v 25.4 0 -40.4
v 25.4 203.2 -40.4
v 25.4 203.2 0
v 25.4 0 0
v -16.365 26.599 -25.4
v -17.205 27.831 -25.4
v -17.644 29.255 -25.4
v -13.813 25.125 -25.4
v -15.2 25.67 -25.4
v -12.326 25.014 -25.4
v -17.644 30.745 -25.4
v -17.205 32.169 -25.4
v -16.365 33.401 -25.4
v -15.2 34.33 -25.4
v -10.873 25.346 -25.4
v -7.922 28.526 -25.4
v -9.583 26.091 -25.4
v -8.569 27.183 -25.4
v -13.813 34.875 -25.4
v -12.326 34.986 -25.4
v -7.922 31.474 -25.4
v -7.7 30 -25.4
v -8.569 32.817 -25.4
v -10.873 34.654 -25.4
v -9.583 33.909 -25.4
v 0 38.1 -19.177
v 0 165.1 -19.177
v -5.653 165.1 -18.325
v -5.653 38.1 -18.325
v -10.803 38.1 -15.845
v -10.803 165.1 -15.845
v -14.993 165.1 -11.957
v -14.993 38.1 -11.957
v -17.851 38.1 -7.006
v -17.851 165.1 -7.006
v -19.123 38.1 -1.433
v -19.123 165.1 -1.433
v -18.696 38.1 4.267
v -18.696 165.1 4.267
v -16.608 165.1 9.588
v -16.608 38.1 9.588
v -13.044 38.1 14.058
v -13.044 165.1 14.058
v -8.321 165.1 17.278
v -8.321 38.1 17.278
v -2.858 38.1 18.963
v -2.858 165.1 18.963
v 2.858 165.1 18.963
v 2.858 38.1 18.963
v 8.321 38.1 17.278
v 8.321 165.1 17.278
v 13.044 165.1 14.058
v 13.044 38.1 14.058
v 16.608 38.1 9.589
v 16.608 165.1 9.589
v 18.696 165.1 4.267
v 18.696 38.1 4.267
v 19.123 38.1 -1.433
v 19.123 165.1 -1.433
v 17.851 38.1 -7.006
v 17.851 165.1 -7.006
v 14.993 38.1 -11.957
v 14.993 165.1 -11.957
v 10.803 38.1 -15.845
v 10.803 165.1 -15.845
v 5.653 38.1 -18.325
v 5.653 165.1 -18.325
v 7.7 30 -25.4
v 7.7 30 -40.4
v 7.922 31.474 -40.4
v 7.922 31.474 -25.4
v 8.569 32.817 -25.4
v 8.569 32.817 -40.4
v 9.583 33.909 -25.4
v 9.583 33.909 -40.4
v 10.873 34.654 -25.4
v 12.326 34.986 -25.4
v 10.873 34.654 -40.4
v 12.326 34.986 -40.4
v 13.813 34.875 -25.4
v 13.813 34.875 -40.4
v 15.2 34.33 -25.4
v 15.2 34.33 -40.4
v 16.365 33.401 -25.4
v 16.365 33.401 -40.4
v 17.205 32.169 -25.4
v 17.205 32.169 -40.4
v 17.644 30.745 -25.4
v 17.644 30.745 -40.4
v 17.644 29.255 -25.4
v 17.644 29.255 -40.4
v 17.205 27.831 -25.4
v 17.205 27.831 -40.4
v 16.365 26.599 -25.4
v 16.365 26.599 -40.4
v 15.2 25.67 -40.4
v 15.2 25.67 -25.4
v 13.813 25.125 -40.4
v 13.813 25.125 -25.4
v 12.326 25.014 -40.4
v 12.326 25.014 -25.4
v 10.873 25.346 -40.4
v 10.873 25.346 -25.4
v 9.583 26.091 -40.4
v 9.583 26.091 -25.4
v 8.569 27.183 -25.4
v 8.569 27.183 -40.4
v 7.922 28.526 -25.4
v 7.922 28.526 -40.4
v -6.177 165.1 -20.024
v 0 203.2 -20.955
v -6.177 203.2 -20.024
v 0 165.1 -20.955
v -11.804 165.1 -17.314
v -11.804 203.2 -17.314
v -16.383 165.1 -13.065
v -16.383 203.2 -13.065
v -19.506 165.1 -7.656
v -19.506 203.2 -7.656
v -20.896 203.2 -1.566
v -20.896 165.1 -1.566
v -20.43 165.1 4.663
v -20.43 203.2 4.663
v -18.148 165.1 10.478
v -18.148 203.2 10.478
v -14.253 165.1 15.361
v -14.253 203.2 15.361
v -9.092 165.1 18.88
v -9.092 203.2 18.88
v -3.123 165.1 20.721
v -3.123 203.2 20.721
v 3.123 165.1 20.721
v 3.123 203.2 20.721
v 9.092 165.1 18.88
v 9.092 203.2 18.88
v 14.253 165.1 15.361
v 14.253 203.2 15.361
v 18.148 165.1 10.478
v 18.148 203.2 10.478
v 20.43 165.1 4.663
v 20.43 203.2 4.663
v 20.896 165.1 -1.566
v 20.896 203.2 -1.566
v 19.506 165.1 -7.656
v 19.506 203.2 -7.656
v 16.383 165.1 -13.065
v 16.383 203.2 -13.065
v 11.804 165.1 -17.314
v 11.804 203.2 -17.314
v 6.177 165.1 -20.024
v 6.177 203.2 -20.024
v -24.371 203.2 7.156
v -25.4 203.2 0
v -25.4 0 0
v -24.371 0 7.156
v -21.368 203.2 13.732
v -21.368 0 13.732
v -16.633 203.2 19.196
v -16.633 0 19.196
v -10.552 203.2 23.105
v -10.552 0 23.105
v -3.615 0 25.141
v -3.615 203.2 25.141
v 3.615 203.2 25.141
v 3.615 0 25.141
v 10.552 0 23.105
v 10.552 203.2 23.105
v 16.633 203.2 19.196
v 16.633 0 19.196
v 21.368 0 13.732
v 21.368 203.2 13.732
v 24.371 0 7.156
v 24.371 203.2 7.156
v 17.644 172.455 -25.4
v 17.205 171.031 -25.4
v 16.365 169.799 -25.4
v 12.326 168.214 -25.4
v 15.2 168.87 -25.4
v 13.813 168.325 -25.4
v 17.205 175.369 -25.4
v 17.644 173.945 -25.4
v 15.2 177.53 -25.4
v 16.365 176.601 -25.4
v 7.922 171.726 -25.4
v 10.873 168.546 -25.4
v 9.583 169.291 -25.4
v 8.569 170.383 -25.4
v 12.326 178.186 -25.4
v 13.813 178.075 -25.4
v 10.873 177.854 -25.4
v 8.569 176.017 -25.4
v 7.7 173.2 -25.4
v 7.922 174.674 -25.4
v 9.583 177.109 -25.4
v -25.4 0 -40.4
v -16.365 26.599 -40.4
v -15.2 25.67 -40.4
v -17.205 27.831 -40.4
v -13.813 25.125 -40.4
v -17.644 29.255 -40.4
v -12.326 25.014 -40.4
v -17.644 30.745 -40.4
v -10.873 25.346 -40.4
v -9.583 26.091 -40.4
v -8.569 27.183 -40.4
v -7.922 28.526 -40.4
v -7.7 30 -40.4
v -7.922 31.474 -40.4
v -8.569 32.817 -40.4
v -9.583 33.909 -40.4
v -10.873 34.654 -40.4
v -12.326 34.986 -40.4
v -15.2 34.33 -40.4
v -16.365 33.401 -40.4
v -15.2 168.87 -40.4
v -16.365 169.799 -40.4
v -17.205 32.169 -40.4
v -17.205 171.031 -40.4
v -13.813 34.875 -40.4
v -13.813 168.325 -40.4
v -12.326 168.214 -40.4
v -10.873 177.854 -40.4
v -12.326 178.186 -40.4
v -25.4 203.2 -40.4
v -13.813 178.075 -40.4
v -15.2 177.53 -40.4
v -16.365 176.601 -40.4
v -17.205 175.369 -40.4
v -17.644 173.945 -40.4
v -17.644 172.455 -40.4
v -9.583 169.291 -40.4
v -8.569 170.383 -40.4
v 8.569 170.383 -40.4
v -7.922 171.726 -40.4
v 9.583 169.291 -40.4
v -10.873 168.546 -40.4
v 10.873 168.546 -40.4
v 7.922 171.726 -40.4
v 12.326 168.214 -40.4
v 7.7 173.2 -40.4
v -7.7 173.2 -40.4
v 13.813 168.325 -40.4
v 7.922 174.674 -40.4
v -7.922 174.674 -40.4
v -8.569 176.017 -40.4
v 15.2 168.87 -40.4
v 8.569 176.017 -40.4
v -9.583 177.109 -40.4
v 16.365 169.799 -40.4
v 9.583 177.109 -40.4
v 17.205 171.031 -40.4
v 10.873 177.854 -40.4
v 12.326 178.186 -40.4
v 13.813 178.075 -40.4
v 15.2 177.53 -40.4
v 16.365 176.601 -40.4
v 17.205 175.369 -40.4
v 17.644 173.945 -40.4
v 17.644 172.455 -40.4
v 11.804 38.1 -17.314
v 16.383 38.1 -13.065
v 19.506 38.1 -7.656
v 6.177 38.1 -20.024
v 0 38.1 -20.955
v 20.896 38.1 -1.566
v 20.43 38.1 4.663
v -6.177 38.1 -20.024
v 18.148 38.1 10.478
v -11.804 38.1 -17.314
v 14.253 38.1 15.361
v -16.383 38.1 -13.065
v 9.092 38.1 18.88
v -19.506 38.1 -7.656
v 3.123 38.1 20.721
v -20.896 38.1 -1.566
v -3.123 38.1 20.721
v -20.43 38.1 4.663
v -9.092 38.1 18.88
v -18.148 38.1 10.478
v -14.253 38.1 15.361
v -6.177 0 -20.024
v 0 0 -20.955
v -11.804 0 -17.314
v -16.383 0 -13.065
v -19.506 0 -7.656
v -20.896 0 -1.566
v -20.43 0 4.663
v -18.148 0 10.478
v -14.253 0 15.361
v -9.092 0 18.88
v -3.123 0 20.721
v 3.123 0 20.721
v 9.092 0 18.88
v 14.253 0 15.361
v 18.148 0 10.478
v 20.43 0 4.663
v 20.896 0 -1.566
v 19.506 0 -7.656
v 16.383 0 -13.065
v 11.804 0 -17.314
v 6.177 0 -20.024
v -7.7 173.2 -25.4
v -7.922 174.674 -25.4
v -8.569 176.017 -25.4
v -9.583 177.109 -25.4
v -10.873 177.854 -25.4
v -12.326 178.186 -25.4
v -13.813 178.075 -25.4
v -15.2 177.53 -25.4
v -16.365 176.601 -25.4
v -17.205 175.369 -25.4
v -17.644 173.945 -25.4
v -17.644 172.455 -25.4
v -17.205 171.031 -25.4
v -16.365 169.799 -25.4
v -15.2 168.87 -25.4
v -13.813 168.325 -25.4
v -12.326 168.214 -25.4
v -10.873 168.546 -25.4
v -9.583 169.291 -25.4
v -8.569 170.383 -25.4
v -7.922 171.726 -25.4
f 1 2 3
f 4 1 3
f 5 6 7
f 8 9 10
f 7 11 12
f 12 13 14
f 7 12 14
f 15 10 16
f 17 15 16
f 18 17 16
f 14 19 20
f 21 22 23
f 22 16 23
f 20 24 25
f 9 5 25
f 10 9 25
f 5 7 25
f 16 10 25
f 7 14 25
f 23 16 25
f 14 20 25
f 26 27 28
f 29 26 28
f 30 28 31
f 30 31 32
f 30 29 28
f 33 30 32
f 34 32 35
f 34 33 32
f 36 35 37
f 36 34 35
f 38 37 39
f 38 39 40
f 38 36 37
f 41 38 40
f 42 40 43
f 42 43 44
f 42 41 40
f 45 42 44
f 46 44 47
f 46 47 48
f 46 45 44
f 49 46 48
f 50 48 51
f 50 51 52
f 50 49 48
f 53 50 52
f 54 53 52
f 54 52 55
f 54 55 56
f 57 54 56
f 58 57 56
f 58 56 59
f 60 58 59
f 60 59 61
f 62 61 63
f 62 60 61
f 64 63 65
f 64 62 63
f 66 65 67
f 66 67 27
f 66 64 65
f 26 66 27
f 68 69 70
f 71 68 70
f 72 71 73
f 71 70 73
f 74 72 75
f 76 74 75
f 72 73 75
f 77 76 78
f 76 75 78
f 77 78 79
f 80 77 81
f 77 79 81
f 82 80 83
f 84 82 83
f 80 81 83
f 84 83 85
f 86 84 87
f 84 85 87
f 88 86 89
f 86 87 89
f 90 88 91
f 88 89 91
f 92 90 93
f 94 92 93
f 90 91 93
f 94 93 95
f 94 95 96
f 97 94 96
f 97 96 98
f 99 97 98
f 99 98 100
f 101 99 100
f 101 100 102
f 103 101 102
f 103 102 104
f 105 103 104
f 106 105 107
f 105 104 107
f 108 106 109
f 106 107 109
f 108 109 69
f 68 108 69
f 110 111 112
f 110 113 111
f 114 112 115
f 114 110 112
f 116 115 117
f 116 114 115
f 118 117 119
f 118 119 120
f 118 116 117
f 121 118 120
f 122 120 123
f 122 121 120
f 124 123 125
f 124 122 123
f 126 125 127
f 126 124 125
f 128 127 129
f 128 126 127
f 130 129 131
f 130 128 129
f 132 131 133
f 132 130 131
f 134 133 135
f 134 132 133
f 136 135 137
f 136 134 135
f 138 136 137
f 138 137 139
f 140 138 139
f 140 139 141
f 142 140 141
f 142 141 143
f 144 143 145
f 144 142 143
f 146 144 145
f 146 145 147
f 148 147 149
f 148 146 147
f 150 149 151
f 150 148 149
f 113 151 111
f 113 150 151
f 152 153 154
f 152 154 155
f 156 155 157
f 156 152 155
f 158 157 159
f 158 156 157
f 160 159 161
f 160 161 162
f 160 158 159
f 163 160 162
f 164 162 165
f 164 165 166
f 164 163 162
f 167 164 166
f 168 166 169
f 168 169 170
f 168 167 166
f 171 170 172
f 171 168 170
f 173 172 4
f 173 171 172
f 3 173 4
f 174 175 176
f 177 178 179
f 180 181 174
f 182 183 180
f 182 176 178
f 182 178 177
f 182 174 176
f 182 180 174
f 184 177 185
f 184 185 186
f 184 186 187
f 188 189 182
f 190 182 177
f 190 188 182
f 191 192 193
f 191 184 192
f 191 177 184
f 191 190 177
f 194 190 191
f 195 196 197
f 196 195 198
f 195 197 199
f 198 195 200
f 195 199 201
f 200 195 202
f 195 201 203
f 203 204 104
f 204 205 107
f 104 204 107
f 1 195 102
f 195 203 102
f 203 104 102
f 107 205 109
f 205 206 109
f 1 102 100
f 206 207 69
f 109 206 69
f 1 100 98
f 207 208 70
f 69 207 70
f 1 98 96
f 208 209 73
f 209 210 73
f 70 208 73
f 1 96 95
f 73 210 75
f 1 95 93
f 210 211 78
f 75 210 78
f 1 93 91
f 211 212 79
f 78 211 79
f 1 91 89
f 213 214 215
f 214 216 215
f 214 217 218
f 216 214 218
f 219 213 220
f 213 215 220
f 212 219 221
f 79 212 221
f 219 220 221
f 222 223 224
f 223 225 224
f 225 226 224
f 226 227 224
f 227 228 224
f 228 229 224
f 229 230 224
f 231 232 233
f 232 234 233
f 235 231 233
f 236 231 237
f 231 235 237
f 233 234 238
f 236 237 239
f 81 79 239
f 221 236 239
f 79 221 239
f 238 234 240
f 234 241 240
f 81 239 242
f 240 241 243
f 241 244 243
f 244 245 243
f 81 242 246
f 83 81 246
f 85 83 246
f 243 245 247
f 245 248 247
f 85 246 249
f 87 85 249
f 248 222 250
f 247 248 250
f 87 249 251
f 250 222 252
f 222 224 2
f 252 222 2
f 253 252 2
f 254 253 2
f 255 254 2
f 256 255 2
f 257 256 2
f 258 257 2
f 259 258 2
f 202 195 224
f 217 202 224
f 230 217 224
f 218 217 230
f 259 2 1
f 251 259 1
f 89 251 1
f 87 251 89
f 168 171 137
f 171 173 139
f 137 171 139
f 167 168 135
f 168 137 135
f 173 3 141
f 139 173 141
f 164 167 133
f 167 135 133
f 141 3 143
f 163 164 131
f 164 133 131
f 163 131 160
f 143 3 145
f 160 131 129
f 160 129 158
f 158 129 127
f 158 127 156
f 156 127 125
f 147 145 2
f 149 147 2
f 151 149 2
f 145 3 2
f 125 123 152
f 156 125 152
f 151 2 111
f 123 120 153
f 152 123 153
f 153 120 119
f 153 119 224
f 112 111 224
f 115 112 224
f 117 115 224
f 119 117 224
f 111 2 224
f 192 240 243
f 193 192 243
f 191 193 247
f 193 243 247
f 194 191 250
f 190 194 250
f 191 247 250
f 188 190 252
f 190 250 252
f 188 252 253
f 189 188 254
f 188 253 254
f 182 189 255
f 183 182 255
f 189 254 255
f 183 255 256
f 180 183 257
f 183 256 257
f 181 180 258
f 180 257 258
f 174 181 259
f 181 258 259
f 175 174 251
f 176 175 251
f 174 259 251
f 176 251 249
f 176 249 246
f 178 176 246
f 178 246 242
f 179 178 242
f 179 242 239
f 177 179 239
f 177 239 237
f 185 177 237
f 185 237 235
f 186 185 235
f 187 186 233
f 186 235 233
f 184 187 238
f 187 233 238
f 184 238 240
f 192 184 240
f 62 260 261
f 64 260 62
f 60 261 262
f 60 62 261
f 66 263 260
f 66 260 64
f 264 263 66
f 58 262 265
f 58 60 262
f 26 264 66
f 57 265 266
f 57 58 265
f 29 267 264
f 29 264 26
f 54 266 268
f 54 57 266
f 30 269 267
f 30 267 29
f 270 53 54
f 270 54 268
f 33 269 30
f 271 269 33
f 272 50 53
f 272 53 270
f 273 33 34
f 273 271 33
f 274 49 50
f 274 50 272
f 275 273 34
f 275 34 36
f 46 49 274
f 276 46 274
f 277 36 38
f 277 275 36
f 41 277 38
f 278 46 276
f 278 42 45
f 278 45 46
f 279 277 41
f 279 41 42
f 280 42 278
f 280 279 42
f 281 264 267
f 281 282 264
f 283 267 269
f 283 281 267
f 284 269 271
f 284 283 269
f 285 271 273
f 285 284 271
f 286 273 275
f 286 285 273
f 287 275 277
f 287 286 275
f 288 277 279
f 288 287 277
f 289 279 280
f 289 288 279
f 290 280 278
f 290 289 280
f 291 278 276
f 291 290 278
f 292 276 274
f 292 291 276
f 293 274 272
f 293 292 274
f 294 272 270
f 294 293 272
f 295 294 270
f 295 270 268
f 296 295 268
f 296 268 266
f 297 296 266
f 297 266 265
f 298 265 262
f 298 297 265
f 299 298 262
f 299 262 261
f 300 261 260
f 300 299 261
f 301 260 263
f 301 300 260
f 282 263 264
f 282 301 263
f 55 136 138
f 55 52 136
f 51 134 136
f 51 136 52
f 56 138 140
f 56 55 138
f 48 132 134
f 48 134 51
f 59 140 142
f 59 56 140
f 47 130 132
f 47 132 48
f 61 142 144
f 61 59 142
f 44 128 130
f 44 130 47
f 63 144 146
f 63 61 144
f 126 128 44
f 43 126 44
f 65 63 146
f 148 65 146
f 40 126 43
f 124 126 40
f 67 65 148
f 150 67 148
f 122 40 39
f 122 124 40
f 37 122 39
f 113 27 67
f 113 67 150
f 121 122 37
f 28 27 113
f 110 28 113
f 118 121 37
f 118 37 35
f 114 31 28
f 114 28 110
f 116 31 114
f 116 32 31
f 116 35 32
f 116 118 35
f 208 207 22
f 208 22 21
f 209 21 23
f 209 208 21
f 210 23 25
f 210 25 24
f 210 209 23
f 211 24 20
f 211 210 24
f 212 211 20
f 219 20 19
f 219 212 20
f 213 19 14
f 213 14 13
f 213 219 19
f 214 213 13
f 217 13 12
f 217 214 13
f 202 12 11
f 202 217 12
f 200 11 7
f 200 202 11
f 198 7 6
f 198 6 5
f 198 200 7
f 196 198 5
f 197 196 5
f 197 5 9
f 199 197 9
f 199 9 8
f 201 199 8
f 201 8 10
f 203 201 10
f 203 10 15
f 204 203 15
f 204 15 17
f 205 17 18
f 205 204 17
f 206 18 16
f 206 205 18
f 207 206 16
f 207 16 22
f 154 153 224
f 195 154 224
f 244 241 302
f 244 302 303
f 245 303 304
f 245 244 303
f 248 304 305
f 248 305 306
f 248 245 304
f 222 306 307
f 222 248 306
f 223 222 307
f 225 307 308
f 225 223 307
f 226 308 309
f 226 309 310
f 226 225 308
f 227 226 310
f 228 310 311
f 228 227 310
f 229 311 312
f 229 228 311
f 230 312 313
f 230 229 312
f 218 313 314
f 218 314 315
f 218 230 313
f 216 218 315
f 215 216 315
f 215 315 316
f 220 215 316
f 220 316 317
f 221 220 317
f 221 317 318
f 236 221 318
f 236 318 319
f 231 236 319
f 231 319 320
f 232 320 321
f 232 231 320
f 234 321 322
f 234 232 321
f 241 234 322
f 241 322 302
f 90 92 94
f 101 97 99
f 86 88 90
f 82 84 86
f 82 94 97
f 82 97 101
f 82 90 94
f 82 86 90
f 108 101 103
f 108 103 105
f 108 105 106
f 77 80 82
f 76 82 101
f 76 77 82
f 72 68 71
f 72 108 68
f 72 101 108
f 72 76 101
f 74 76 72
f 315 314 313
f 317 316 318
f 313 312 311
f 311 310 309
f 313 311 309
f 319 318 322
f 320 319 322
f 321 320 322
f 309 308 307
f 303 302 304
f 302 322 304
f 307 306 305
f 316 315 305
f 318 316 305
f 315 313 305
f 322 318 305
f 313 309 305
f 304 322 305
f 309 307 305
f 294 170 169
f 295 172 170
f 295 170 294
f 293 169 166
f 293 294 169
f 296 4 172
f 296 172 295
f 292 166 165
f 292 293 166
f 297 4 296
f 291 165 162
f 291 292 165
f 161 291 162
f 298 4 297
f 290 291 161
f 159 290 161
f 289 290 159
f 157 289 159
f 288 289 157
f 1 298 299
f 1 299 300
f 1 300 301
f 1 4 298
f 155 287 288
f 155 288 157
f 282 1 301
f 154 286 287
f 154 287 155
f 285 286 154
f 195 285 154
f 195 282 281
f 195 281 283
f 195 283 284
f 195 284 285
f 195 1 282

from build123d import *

# Parameters (mm, degrees)
BOSS_EXTRUDE1_START = -203.2
BOSS_EXTRUDE1_DEPTH = 203.2
SKETCH15_R          = 5
CUT_EXTRUDE1_DEPTH  = 15


with BuildPart() as part:
    # Sketch12 → Revolve1 (revolve)
    with BuildSketch(Plane.XY, mode=Mode.PRIVATE) as revolve1_sk:
        Polygon((-25.399999994, 0), (-25.399999994, 203.2), (-20.955, 203.2), (-20.955, 165.1), (-19.177, 165.1), (-19.177, 38.1), (-20.955, 38.1), (-20.955, 0), align=None)
    revolve(revolve1_sk.sketch.rotate(Axis((0, 0, 0), (0, 1, 0)), 270), axis=Axis((0, 0, 0), (0, 1, 0)))

    # Sketch13 → Boss-Extrude1 (add)
    with BuildSketch(Plane(origin=(0, 0, 0), x_dir=(-1, 0, 0), z_dir=(0, -1, 0)).offset(BOSS_EXTRUDE1_START)):
        with BuildLine():
            Line((12.584838028, 40.399999994), (-25.399999994, 40.399999994))
            Line((-25.399999994, 40.399999994), (-25.399999994, 0))
            ThreePointArc((-25.399999994, 0), (0, 25.399999994), (25.399999994, 0))
            Line((25.399999994, 0), (25.399999994, 40.399999994))
            Line((25.399999994, 40.399999994), (22.584838028, 40.399999994))
            Line((22.584838028, 40.399999994), (12.584838028, 40.399999994))
        make_face()
    extrude(amount=BOSS_EXTRUDE1_DEPTH)

    # Sketch15 → Cut-Extrude1 (cut)
    with BuildSketch(Plane(origin=(0, 0, -40.399999994), x_dir=(-1, 0, 0), z_dir=(0, 0, -1))):
        with Locations((-12.699999997, 30)):
            Circle(SKETCH15_R)
        with Locations((-12.699999997, 173.2)):
            Circle(SKETCH15_R)
    cut_extrude1 = extrude(amount=-CUT_EXTRUDE1_DEPTH, mode=Mode.SUBTRACT)

    # Mirror1: Cut-Extrude1 across plane
    add(cut_extrude1.mirror(Plane(origin=(0, 0, 0), x_dir=(0, 0, 1), z_dir=(1, 0, 0))), mode=Mode.SUBTRACT)


solid = part.part
